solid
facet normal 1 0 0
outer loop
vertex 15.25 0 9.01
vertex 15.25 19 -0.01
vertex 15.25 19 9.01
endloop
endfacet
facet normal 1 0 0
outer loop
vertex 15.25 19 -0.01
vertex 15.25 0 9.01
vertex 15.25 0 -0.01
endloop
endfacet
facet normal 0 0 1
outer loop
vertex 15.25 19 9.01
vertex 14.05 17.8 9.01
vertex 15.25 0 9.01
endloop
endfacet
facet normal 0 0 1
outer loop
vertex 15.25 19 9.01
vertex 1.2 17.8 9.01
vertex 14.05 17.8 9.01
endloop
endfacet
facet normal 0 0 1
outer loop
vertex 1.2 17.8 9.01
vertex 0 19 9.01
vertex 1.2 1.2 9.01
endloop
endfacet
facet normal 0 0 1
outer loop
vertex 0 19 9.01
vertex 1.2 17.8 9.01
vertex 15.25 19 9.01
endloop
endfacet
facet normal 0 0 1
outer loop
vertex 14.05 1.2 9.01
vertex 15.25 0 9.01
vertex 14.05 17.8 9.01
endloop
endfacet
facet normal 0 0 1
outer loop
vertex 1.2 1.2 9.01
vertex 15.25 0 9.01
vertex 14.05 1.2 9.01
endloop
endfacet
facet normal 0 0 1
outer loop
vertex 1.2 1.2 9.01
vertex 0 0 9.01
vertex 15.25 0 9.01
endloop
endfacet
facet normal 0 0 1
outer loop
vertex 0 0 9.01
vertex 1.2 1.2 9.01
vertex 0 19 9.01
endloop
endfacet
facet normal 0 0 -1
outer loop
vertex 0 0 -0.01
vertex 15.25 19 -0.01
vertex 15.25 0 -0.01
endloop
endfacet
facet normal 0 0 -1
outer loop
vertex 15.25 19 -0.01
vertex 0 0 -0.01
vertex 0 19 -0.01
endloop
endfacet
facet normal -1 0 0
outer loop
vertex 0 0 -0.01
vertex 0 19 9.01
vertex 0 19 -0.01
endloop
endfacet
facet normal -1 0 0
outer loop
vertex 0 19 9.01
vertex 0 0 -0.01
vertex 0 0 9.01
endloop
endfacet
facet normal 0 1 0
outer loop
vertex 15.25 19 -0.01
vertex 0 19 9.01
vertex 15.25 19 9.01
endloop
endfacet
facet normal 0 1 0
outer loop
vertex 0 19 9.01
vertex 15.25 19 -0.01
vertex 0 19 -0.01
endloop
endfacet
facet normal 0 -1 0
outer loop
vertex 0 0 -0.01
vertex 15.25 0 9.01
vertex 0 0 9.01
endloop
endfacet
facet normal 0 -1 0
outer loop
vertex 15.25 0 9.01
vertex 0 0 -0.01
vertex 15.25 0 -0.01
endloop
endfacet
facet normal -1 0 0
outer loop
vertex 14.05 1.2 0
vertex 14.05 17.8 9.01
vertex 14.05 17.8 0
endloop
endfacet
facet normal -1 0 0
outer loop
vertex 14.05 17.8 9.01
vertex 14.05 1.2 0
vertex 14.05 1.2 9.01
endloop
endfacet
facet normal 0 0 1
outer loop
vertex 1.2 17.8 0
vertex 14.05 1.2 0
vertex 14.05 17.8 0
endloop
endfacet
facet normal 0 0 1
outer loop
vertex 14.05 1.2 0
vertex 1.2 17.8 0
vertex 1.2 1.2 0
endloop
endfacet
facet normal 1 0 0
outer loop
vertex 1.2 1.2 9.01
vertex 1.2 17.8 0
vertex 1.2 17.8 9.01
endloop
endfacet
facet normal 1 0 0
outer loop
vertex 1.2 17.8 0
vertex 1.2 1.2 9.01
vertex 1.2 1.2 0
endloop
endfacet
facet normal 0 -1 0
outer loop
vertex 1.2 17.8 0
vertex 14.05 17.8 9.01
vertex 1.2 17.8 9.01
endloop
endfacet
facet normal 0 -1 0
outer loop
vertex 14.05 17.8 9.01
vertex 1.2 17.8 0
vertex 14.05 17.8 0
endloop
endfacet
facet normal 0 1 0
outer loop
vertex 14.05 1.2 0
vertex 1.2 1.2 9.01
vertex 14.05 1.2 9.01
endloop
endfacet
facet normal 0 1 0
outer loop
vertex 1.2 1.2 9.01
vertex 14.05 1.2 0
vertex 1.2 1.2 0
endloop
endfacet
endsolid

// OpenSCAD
// file: ../Base/Rotation.scad
// Fischertechnik Box Foundation
// Geometry Helpers Rotation

include <PlacementOptions.scad>

// getRotatedSpace(space, rotation=NoRotation)
// Rotates the space dependent on the specified rotation

function getRotatedSpace(space, rotation=NoRotation) = [
    (rotation == Rotate90 || rotation == Rotate270) ? space.y : space.x,
    (rotation == Rotate90 || rotation == Rotate270) ? space.x : space.y
];

// Rotates the given space around the fixed left lower corner
// space = the space the children needs as width/depth list [width,depth]
// rotation = 0 Rotate0 degrees, 1 Rotate90 degrees, 2 Rotate180 degrees, 3 Rotate270 degrees (equivalent to -90)

module RotateFix(space, rotation=NoRotation) {
    dy = (rotation == Rotate0 || rotation == Rotate270) ? 0 :
        (rotation == Rotate90) ? space.x :
        space.y;
    dx = (rotation < Rotate180) ? 0 :
        (rotation == Rotate180) ? space.x :
        space.y;
    
    translate([dx, dy, 0])
        rotate([0, 0, rotations[rotation]])
            children();
}
// file: ../Base/Alignment.scad
// Fischertechnik Box Foundation
// Geometry Helpers Alignment

include <PlacementOptions.scad>

// getAlignedX(elementWidth, spaceWidth, align=AlignRight, offset=0)
// Gets the aligned X offset of an element with the given
// width in the given space.
// elementWidth = The width of the element to positon
// spaceWidth = The space where the element should be aligned
// align = 0 AlignLeft, 1 AlignCenter, 2 AlignRight
// offset = an optional offset from the aligned position. When
// aligned left or centered, then positive values are in X direction.
// When aligned right then positive values are in negative X direction.

function getAlignedX(elementWidth, spaceWidth, align=AlignRight, offset=0) =
    (align == AlignLeft) ?
        offset :
        ((align == AlignCenter) ?
        (spaceWidth - elementWidth)/2 + offset :
        spaceWidth - offset - elementWidth);

// getAlignedY(elementDepth, spaceDepth, align=AlignTop, offset=0)
// Gets the aligned Y offset of an element with the given
// depth in the given space.
// elementDepth = The depth of the element to positon
// spaceDepth = The space where the element should be aligned
// align = 0 AlignBottom, 1 AlignCenter, 2 AlignTop
// offset = an optional offset from the aligned position. When
// aligned bottom or centered, then positive values are in Y direction.
// When aligned top then positive values are in negative Y direction.

function getAlignedY(elementDepth, spaceDepth, align=AlignTop, offset=0) =
    (align == AlignBottom) ?
        offset :
        ((align == AlignCenter) ?
        (spaceDepth - elementDepth)/2 + offset :
        spaceDepth - offset - elementDepth);
// file: ../Base/PlacementOptions.scad
// Fischertechnik Box Foundation
// Placement Options

// Alignment
NoAlign = 0;
AlignLeft = 1;
AlignBottom = 2;
AlignCenter = 3;
AlignRight = 4;
AlignTop = 5;

// Element rotation degree steps
rotations = [0, -90, -180, -270];

// Rotation
NoRotation = 0;
Rotate0 = 0;
Rotate90 = 1;
Rotate180 = 2;
Rotate270 = 3;

// Docking (seen from above)
NoDock = -1;
DockLeft = 0;
DockTop = 1;
DockRight = 2;
DockCorner = 2;
DockBottom = 3;

// Web corners
LowerLeft = 0;
UpperLeft = 1;
UpperRight = 2;
LowerRight = 3;

// Web position relative to corner
LeftOfCorner = 0;
RightOfCorner = 1;
// file: ../Base/Boxes.scad
// Fischertechnik Box Foundation
// Pre-designed Boxes

use <Constants.scad>

include <PlacementOptions.scad>

box190Width = 190;
box190Depth = 130;
box130Width = 130;
box130Depth = 95;

// Values are from an original ec3 box
topBottomDifference = 1.5;
outerHeight = 40;
innerHeight = 38.2;
baseThickness = outerHeight - innerHeight;
stackExcess = 5.7;
radius = 3.5;
wallThickness = 1.5;
tolerance = 0.2;
stackOffset = innerHeight - stackExcess;

boxUsageHeight = stackOffset;
boxWallThickness = wallThickness;
boxBaseThickness = baseThickness;
boxWebWidth = 3.0;

// getBoxWallThickness()
// Gets the wall thickness of a Fischertechnik Box
function getBoxWallThickness() = boxWallThickness;

// getBoxUsageHeight()
// Gets the usable height of a Fischertechnik box
function getBoxUsageHeight() = boxUsageHeight;

// getBoxInnerHeight()
// Gets the inner height of a Fischertechnik box, including the stack excess
function getBoxInnerHeight() = innerHeight;

// getBoxBaseThickness()
// Gets the thickness of the Fischertechnik box base.
function getBoxBaseThickness() = boxBaseThickness;

// getBoxWebWidth()
// Gets the width of a box web
function getBoxWebWidth() = boxWebWidth;

// getBox190Space()
// Gets the usable inner space of a Box 190 as an x/y-list
function getBox190Space() = [
    box190Width - 2*getBoxWallThickness() - topBottomDifference, 
    box190Depth - 2*getBoxWallThickness() - topBottomDifference ];

// BoxBase(width, depth)
// Creates an empty stackable Fischertechnik compatible box
// width = Outer width of the box (190, 130, ...)
// depth = Outer depth of the box (130, 95, ...)

module BoxBase(width, depth, height=outerHeight) {    
    thinPlate = 0.01;

    innerHeight = height - baseThickness;    
    
    module BodyPlate(width, depth) {
        translate([radius, radius])
        hull() {
            w = width-2*radius;
            d = depth-2*radius;
            cube([w, d, thinPlate]);
            cylinder(thinPlate, r=radius, $fn=getFragments());
            translate([w, 0])
                cylinder(thinPlate, r=radius, $fn=getFragments());
            translate([w, d])
                cylinder(thinPlate, r=radius, $fn=getFragments());
            translate([0, d])
                cylinder(thinPlate, r=radius, $fn=getFragments());
        }
    }
    
    module Body(tolerance=tolerance) {
        hull() {
            // Bottom with tolerance to fit into the original boxes when stacked
            translate([-wallThickness+tolerance, -wallThickness+tolerance, -baseThickness])
                BodyPlate(width-topBottomDifference-2*tolerance, depth-topBottomDifference-2*tolerance);
            
            // Top
            translate([-wallThickness-topBottomDifference/2, -wallThickness-topBottomDifference/2, innerHeight-thinPlate])
                BodyPlate(width, depth);
         }
    }

    module Cutoff() {
        hull() {
            coWidth = width - 2*wallThickness;
            coDepth = depth - 2*wallThickness;
            
            // Bottom
            BodyPlate(coWidth-topBottomDifference, coDepth-topBottomDifference);

            // Top
            translate([-topBottomDifference/2, -topBottomDifference/2, innerHeight+thinPlate]) 
                BodyPlate(coWidth, coDepth);
        }
    }
    
    difference() {        
        Body();
        Cutoff();
        stackOffset = innerHeight - stackExcess;
        translate([0, 0, stackOffset + baseThickness])
            Body(tolerance=0);
    }
}

// Creates the Fischertechnik empty box 130x190 mm and places it at position 0,0
// 190x130 are the outer sizes, the inner space is slightly smaller. Use getBox190Space() to get the inner sizes.
// The box is positioned that the usable inner space is at the 0,0,0 position. The

module Box190() {
    BoxBase(box190Width, box190Depth);
}

// Gets the usable inner space of a Box 130 as an x/y-list
function getBox130Space() = [
    box130Width - 2*getBoxWallThickness() - topBottomDifference, 
    box130Depth - 2*getBoxWallThickness() - topBottomDifference ];

// Creates the Fischertechnik empty box 95x130 mm and places it at position 0,0
// 190x130 are the outer sizes, the inner space is slightly smaller. Use getBox190Space() to get the inner sizes.
// The box is positioned that the usable inner space is at the 0,0,0 position. The

module Box130() {
    BoxBase(box130Width, box130Depth);
}

// Creates a web at the specified box walls
// corner 0 = LowerLeft, 1 = UpperLeft, 2 = UpperRight, 3 = LowerRight
// side 0 = LeftOfCorner, 1 = RightOfCorner
// distance = Distance in mm from the corner
// boxSpace = inner width and depth of the box (default: Box 190)
// webWidth = length of the web (default is 3 mms)
// webThickness = thickness of the web (default is 1 mm)

module BoxWeb(corner, side, distance, boxSpace=getBox190Space(), webWidth=getBoxWebWidth(), webThickness=1.0) {
    sink = getBoxWallThickness()/2;

    width = (corner % 2 == 0) ? 
            (side == LeftOfCorner ? webWidth : webThickness) :
            (side == LeftOfCorner ? webThickness : webWidth);

    depth = (corner % 2 == 0) ? 
            (side == RightOfCorner ? webWidth : webThickness) :
            (side == RightOfCorner ? webThickness : webWidth);
    
    xDiff = corner == LowerLeft ? 
                (side == LeftOfCorner ? -sink : distance) :
            (corner == UpperLeft ?                
                (side == LeftOfCorner ? distance : -sink) :
            (corner == UpperRight ?
                (side == LeftOfCorner ? boxSpace.x-webWidth+sink : boxSpace.x-distance-webThickness) :
                (side == LeftOfCorner ? boxSpace.x-distance-webThickness: boxSpace.x-webWidth+sink)));

    yDiff = corner == LowerLeft ? 
                (side == RightOfCorner ? -sink : distance) :
            (corner == UpperLeft ?
                (side == RightOfCorner ? boxSpace.y-distance : boxSpace.y-webWidth+sink) :
            (corner == UpperRight ?
                (side == RightOfCorner ? boxSpace.y-webWidth+sink : boxSpace.y-distance) :
                (side == RightOfCorner ? distance : -sink)));
    
    translate([xDiff, yDiff, -getExcess()])
        cube([width, depth, boxUsageHeight + 2*getExcess()]);
}
// file: ../Base/Placement.scad
// Fischertechnik Box Foundation
// Geometry Helpers Placement

use <Constants.scad>
use <Alignment.scad>
use <Rotation.scad>
use <Boxes.scad>

include <PlacementOptions.scad>

// Place(x=0, y=0, elementSpace=[0,0], alignX=AlignLeft, alignY=AlignBottom, rotation=Rotate0, boxSpace=getBox190Space())
// Places the child at the specified position
// y = Y-Position. This is a relative position when an X aligment is specified.
// x = X-Position. This is a relative position when an Y aligment is specified.
// elementSpace = space of the element to be placed [x,y]
// alignX = -1=NoAlign, 0 AlignLeft, 1 AlignCenter, 3 AlignRight (elementSpace and boxSpace required!)
// alignY = -1=NoAlign, 2 AlignBottom, 1 AlignCenter, 4 AlignTop (elementSpace and boxSpace required!)
// rotation = 0 Rotate0 0 degrees, 1 Rotate90 90 degrees, 
// 2 Rotate180 180 degrees, 3 Rotate270 270 degrees (equivalent to -90)
// boxSpace = Inner space of the box where the placement occurs [x,y] - default is Box 190x130 inner space

module Place(x=0, y=0, elementSpace=[0,0], 
  alignX=AlignLeft, alignY=AlignBottom, 
  rotation=NoRotation, boxSpace=getBox190Space()) {

    module Position(x, y, space, rotation=Rotate0) {
        translate([x, y, 0])
            RotateFix(space, rotation)
                children();
    }

    space = getRotatedSpace(elementSpace, rotation);
    alignedX = getAlignedX(space.x, boxSpace.x, alignX, x);
    alignedY = getAlignedY(space.y, boxSpace.y, alignY, y);
    Position(alignedX, alignedY, elementSpace, rotation)
        children();
}

// Center(space=getBox130Space(), elementSpace=[0,0])
// space = Space where the children is centered. For cylinder use centered=true and no elementSpace.
// elementSpace = space of the element to be centered [x,y]

module Center(space=getBox190Space(), elementSpace=[0,0]) {
    Place(elementSpace=elementSpace, boxSpace=space, alignX=AlignCenter, alignY=AlignCenter)
        children();
}

// CenterHorizontal(width=0, y=0, offset=0, space=getBox130Space())
// width = Width of the element to be placed.
// y = Y position of the element
// offset = Offset from the center position (negative will be left of the center)
// space = Space where the element is placed

module CenterHorizontal(width=0, y=0, offset=0, space=getBox190Space()) {
    Place(x=offset, y=y, elementSpace=[width, 0], boxSpace=space, alignX=AlignCenter)
        children(0);
}

// CenterVertical(depth=0, x=0, offset=0, space=getBox130Space())
// depth = Depth of the element to be placed.
// x = X position of the element
// offset = Offset from the center position (negative will be down of the center)
// space = Space where the element is placed

module CenterVertical(depth=0, x=0, offset=0, space=getBox190Space()) {
    Place(x=x, y=offset, elementSpace=[0, depth], boxSpace=space, alignY=AlignCenter)
        children(0);
}

// getIsVertical(align)
// True if the specified alignment needs a vertical orientation for a divider (AlignRight, AlignLeft)

function getIsVertical(align) = (align == AlignRight || align == AlignLeft);

// getIsHorizontal(align)
// True if the specified alignment needs a horizontal orientation for a divider (AlignTop, AlignBottom)

function getIsHorizontal(align) = (align == AlignTop || align == AlignBottom);
// file: ../Base/Constants.scad
// Fischertechnik Box Foundation
// Constants

// Constant values necessary for multiple elements

// Base constants
dividerThickness = 1.2;
excess = 0.01;
fragments = 90;
tolerance = 0.8;

// Gets the thickness of a divider 
function getDividerThickness() = dividerThickness;

// Gets the excess that is used to merge walls into each other
function getExcess() = excess;

// Gets amount of fragments of a cylinder
function getFragments() = fragments;

// Gets the inner tolerance of a frame to each side
function getTolerance() = tolerance;


// Fischertechnik specific constants
axisDiameter = 4;
axisBottomDiameter = axisDiameter + 1;
standardEdgeDistance = 2.5;
standardWebDistance = 11.5;
standardCornerLength = 15;
tubeWallFactor = 0.8;
smallPartsFrameHeight = 20;

// Gets axis diameter
function getAxisDiameter() = axisDiameter;

// Gets axis bottom diameter for thicker part at the bottom
function getAxisBottomDiameter() = axisBottomDiameter;

// gets the standard distance to the wall of the box for dockable frames with webs
function getStandardEdgeDistance() = standardEdgeDistance;

// gets the standard distance of each web to the corner of the dockable frame
function getStandardWebDistance() = standardWebDistance;

// gets the standard length of the corner walls of a dockable frame
function getStandardCornerLength() = standardCornerLength;

// gets the wall thickness of a tube.
function getTubeWallThickness() = tubeWallFactor * getDividerThickness();

// gets the frame height for docked small parts boxes.
function getSmallPartsFrameHeight() = smallPartsFrameHeight;
// main file
// Fischertechnik Box Library
// Frame for isosceles angle blocks
// 31011

use <../Base/Constants.scad>
use <../ModelBase/Simple.scad>

/* [Element Parameters] */
count = 1;

/* [Hidden] */
width = 45 / 4;
depth = 15;
height = 9;

// getFrameAngleEquilateralSpace
// Gets the space the frame angle equilateral needs for count blocks as width and depth (.x and .y as a list)
// count = Count of equilateral angle blocks

function getFrameAngleIsoscelesSpace(count=1) = getFrameOuterVolume([width * count, depth, height]);
/*[
    frameGridWidth * count + 2 * getWallThickness() + getTolerance(), 
    frameGridDepth + 2 * getWallThickness() + getFrameInnerGap()];*/

// FrameAngleIsosceles(count)
// count = Count of angle blocks in x direction
// The walls of the frame are 9 mm high.
// The complete frame has a tolerance of addition 1 mm in each direction.

module FrameAngleIsosceles(count=1) {
    innerVolume = getFrameInnerVolume([width * count, depth, height]);
    Frame(innerVolume);
}

// Tests
color ("lightgray")
FrameAngleIsosceles(count);
